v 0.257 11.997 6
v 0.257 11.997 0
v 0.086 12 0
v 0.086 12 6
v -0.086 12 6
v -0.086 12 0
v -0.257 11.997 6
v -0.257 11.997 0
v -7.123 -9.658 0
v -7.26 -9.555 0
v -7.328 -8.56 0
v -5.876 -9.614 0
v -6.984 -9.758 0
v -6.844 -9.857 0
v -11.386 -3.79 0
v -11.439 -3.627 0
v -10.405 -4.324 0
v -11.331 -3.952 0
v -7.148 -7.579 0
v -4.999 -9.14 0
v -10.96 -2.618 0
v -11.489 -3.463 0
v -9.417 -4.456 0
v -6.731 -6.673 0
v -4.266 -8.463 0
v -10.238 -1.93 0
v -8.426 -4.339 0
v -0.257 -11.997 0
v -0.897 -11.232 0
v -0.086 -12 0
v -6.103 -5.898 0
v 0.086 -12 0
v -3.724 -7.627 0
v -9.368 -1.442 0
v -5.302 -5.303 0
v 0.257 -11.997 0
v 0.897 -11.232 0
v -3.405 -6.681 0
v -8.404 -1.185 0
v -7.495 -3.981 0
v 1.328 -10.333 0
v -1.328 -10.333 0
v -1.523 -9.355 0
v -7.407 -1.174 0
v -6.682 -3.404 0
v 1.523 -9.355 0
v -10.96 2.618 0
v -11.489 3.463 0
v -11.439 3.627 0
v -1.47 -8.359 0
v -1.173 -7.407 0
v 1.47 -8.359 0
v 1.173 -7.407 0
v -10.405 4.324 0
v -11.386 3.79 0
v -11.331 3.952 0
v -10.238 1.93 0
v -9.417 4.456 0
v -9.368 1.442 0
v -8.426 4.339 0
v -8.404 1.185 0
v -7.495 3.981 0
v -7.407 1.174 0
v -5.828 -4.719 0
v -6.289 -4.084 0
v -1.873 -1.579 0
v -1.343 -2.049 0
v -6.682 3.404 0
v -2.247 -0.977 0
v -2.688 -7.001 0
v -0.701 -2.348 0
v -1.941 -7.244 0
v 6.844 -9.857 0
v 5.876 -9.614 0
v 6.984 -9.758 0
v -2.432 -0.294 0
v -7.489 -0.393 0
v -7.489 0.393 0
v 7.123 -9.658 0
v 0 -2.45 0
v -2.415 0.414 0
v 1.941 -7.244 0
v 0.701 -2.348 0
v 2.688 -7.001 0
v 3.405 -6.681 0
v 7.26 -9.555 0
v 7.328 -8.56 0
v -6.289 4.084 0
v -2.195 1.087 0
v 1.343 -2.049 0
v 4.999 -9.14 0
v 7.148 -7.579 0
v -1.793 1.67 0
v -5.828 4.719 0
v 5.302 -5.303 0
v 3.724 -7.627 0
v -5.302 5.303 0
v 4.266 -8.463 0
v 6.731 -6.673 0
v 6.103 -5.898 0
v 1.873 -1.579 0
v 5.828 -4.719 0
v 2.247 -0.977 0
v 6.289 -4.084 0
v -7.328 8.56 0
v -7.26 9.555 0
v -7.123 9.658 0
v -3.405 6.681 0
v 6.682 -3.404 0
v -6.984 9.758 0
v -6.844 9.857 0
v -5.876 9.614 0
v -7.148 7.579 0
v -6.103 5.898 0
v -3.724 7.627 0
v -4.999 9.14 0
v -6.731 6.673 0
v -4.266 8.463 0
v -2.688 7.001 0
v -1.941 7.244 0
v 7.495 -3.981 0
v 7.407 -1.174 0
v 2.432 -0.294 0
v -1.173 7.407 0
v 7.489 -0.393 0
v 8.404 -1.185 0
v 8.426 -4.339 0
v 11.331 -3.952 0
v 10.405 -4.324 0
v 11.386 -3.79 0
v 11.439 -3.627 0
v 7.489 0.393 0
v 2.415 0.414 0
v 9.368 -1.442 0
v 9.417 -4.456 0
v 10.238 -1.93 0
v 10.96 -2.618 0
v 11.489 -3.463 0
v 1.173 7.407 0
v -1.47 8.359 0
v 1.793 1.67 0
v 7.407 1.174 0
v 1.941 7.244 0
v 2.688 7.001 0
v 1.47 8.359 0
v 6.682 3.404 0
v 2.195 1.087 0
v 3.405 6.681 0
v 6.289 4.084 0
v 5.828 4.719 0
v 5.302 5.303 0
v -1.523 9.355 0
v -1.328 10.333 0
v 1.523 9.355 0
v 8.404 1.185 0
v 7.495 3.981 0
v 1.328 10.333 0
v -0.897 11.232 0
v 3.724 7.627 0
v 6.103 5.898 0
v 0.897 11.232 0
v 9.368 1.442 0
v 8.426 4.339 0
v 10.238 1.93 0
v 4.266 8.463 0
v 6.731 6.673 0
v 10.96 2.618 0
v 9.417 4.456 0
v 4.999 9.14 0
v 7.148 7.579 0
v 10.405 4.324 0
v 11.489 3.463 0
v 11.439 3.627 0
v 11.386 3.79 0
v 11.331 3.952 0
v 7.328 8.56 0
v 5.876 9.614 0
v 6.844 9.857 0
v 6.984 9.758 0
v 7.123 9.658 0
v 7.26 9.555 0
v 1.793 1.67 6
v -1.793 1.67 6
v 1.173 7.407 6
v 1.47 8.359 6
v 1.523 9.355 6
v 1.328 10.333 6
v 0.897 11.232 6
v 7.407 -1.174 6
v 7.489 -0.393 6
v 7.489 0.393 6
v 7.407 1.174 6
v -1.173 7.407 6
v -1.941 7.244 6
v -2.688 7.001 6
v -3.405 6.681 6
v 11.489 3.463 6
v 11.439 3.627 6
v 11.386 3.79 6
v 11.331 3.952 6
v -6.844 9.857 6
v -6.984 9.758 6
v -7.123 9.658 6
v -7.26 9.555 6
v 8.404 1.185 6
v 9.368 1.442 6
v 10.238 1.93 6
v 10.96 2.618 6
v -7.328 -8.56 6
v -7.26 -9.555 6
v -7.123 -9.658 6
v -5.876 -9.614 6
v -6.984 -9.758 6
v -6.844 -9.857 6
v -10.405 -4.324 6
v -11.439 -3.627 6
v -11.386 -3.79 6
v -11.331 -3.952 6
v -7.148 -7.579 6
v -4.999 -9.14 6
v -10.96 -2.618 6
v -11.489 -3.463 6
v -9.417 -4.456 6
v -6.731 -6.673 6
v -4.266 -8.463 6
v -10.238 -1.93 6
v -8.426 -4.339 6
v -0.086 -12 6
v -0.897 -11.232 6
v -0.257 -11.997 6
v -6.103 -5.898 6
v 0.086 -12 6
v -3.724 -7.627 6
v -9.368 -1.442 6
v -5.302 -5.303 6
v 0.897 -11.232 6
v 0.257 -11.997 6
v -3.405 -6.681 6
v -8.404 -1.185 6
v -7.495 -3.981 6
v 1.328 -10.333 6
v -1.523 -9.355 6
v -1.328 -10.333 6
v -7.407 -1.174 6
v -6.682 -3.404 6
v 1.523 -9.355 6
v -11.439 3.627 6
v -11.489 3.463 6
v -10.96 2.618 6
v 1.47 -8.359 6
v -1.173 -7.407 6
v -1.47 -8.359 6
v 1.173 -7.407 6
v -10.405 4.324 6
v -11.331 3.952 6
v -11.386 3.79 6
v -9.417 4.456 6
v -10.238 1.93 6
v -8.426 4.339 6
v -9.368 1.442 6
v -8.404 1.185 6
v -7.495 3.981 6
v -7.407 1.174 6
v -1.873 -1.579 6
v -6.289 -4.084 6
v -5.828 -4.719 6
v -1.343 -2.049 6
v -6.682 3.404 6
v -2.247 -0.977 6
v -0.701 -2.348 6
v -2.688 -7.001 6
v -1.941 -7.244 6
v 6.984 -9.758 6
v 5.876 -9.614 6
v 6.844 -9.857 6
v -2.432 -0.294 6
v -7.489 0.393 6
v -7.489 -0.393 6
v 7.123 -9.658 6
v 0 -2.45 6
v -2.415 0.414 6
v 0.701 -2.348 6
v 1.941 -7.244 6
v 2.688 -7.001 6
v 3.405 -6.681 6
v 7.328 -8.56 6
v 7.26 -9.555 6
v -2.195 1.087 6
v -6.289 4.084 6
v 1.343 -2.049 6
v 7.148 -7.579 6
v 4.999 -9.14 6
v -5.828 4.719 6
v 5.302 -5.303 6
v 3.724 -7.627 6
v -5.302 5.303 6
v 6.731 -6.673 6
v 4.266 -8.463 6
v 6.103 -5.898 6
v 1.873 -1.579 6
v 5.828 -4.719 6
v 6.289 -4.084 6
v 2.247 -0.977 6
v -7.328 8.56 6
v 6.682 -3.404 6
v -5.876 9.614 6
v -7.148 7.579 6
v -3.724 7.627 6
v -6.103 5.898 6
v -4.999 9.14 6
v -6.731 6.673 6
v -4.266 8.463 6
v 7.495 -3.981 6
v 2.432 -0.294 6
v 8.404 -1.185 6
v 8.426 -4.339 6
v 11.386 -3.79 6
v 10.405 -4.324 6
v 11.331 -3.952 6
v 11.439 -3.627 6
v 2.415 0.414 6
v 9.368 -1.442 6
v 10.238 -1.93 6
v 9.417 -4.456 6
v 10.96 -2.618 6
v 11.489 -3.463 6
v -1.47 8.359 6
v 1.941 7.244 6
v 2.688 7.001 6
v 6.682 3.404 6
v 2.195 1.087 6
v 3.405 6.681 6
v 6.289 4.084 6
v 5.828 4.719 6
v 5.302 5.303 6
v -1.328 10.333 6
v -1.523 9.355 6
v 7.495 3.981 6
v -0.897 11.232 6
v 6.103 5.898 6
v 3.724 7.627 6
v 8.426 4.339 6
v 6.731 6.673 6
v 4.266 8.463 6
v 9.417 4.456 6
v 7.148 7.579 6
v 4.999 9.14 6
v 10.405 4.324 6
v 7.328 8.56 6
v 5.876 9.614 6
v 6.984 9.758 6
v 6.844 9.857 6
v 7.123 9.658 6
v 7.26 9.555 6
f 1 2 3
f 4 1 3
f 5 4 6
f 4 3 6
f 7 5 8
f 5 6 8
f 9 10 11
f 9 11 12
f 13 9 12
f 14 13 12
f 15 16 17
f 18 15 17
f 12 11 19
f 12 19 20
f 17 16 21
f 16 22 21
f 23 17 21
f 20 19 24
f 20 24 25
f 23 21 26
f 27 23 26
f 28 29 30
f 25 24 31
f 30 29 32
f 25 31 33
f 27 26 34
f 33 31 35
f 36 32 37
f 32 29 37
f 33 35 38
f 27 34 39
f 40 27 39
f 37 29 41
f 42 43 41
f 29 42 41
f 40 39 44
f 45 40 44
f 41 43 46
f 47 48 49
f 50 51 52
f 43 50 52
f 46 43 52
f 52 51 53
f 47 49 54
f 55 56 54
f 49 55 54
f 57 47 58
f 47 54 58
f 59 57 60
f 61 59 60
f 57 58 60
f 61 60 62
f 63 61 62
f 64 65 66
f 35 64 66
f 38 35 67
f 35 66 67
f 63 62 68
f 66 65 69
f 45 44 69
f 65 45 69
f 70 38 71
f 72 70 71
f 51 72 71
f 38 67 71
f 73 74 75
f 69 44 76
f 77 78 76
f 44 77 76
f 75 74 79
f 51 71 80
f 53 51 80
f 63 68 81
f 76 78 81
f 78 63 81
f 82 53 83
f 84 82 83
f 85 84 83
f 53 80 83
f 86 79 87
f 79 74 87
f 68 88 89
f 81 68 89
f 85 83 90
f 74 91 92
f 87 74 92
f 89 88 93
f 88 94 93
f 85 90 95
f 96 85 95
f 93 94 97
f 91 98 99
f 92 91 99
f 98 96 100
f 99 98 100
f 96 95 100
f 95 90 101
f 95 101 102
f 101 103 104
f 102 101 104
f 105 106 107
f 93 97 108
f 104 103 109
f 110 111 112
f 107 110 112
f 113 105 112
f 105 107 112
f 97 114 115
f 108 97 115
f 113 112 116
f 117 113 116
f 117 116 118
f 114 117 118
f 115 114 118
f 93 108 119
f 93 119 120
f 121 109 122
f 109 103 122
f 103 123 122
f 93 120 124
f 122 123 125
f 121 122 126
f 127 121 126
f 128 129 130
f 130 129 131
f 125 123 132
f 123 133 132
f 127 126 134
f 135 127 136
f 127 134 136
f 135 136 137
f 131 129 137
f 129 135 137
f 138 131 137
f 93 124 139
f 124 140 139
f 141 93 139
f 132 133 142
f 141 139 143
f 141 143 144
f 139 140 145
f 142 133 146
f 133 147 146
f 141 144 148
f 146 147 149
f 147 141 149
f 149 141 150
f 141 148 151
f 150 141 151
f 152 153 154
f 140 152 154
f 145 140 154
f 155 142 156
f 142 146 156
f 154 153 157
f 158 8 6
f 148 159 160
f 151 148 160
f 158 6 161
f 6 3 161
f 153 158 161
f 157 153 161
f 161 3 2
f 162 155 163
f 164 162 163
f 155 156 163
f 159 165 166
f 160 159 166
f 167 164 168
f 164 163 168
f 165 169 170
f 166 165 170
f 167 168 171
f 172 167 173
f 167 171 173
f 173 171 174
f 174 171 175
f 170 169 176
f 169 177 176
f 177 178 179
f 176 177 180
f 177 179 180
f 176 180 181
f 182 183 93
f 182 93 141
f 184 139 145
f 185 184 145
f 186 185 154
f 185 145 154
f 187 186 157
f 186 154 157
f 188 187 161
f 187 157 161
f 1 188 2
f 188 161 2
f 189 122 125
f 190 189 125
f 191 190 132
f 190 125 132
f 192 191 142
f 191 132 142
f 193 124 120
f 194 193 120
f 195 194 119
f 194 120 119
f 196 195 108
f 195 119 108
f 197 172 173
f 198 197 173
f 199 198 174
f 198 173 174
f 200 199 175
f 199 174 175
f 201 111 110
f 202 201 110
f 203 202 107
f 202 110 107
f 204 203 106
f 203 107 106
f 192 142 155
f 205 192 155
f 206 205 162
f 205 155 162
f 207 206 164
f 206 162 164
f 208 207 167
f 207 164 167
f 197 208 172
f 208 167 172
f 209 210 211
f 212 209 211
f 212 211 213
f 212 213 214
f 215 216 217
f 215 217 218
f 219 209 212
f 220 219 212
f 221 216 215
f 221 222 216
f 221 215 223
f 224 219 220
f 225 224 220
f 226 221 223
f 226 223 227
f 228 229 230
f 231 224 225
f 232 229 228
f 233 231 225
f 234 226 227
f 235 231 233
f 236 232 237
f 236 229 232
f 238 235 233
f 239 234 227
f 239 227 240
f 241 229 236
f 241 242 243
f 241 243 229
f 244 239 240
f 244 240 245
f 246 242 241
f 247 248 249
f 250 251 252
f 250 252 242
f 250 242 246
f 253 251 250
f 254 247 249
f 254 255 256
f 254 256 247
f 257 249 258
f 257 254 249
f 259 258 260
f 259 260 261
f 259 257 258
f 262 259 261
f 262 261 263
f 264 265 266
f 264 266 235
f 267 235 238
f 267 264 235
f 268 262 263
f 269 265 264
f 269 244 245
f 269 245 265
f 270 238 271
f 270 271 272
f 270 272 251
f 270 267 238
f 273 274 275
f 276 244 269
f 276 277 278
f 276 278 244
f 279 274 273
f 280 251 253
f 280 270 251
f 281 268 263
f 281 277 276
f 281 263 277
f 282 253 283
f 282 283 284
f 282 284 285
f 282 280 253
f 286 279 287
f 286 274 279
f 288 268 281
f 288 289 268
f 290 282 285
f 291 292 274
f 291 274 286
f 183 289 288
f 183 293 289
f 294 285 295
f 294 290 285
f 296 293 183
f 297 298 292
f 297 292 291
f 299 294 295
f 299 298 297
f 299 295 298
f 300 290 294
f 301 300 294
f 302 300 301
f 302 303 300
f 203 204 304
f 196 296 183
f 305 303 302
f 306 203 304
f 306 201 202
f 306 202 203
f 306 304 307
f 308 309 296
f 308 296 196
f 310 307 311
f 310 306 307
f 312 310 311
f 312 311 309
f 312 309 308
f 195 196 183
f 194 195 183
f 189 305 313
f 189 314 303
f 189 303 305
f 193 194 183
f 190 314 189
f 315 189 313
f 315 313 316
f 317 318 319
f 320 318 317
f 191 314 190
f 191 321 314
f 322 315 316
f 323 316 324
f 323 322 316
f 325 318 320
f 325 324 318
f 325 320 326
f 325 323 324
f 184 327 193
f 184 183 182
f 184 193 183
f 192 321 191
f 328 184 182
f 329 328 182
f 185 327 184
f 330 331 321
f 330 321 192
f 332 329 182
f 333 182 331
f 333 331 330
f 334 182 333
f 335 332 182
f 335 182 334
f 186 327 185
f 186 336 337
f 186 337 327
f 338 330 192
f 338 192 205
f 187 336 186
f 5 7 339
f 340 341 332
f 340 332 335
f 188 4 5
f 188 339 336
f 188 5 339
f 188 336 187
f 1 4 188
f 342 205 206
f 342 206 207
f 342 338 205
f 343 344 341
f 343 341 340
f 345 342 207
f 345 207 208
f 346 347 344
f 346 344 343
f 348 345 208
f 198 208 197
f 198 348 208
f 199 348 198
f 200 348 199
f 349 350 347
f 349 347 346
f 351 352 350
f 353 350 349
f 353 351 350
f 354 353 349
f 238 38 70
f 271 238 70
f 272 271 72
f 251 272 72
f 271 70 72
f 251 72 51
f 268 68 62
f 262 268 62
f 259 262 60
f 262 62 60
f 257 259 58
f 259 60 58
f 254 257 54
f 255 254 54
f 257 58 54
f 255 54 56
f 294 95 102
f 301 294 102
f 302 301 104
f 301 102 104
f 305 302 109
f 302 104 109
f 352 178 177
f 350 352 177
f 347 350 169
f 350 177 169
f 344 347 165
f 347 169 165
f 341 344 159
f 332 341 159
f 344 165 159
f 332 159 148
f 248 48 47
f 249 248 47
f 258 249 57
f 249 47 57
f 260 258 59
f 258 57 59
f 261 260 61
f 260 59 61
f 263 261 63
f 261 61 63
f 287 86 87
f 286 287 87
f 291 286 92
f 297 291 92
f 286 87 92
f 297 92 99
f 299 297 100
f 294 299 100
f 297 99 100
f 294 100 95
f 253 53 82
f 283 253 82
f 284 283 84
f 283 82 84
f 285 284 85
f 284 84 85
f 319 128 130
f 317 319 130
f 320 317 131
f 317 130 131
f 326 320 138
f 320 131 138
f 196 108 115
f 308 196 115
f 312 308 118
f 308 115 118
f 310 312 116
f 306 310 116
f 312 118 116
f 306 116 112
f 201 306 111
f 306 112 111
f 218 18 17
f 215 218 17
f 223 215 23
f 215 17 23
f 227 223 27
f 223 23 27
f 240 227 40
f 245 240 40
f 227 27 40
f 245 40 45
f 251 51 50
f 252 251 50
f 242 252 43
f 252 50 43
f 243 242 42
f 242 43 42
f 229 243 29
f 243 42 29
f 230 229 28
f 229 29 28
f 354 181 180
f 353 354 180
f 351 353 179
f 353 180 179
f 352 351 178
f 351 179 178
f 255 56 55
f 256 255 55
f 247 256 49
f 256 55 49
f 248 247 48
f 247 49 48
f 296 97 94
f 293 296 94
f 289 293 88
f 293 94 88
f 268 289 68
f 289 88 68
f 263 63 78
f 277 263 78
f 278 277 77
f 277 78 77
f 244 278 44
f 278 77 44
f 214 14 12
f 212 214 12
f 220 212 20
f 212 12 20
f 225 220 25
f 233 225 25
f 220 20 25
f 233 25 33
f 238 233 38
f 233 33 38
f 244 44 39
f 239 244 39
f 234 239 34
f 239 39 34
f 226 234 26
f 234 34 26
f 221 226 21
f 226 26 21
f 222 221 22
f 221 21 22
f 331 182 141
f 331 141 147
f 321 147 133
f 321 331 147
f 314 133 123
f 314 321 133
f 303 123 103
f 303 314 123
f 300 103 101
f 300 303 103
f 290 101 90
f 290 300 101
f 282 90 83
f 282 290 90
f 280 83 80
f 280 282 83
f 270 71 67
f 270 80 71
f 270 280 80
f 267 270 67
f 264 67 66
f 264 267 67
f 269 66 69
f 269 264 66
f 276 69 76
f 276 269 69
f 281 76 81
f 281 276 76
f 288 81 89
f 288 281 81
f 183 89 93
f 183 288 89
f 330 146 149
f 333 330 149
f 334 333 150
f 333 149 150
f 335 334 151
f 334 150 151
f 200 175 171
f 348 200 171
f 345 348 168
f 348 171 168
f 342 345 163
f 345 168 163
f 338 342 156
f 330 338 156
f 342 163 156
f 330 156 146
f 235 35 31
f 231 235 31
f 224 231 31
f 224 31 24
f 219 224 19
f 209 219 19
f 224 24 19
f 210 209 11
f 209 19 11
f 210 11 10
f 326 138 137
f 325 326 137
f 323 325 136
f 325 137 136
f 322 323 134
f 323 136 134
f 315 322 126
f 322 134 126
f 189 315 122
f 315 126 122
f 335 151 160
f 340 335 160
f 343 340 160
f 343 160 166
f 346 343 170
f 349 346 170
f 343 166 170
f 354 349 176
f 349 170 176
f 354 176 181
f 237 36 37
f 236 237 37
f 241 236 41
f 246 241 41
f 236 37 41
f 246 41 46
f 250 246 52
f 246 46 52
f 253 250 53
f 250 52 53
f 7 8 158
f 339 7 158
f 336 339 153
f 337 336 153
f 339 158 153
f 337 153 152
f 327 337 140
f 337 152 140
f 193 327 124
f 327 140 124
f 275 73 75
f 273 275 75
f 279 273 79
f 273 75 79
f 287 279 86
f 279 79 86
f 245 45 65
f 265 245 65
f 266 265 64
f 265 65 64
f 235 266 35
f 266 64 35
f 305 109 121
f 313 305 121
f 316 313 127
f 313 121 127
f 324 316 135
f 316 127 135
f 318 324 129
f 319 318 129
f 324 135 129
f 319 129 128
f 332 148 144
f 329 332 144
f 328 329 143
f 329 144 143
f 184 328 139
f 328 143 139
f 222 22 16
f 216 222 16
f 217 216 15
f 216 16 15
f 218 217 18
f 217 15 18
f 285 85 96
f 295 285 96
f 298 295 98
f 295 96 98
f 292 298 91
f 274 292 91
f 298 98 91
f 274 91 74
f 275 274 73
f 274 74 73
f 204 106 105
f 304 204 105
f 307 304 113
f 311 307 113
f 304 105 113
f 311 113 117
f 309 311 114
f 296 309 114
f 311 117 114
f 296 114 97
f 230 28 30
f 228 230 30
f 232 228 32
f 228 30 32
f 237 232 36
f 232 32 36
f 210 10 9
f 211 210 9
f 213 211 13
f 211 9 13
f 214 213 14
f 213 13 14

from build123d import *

# Parameters (mm, degrees)
SKETCH4_R           = 2
BOSS_EXTRUDE3_DEPTH = 6
SKETCH6_R           = 3.276903459
BOSS_EXTRUDE4_DEPTH = 6
CUT_EXTRUDE1_DEPTH  = 10


with BuildPart() as part:
    # Sketch4 → Boss-Extrude3 (new body)
    with BuildSketch(Plane.XY):
        with BuildLine():
            ThreePointArc((11.330682707, 3.9516616), (8.917819898, 4.428819506), (6.681915604, 3.403968986))
            ThreePointArc((6.681915604, 3.403968986), (6.066818441, 4.407801607), (5.302192362, 5.302995112))
            ThreePointArc((5.302192362, 5.302995112), (6.967815552, 7.112770233), (7.259627029, 9.554989032))
            ThreePointArc((7.259627029, 9.554989032), (7.053423028, 9.708203932), (6.843986457, 9.856969584))
            ThreePointArc((6.843986457, 9.856969584), (4.61147306, 8.824753264), (3.40498051, 6.681400208))
            ThreePointArc((3.40498051, 6.681400208), (2.317318441, 7.131972816), (1.172541409, 7.406763642))
            ThreePointArc((1.172541409, 7.406763642), (1.456299749, 9.849931218), (0.256880001, 11.997250213))
            ThreePointArc((0.256880001, 11.997250213), (0, 12), (-0.256880001, 11.997250213))
            ThreePointArc((-0.256880001, 11.997250213), (-1.456299749, 9.849931218), (-1.172541409, 7.406763642))
            ThreePointArc((-1.172541409, 7.406763642), (-2.317318441, 7.131972816), (-3.404980509, 6.681400207))
            ThreePointArc((-3.404980509, 6.681400207), (-4.61147306, 8.824753264), (-6.843986457, 9.856969584))
            ThreePointArc((-6.843986457, 9.856969584), (-7.053423028, 9.708203933), (-7.259627029, 9.554989032))
            ThreePointArc((-7.259627029, 9.554989032), (-6.967815552, 7.112770233), (-5.302192362, 5.302995112))
            ThreePointArc((-5.302192362, 5.302995112), (-6.066818441, 4.407801607), (-6.681915604, 3.403968986))
            ThreePointArc((-6.681915604, 3.403968986), (-8.917819898, 4.428819506), (-11.330682707, 3.9516616))
            ThreePointArc((-11.330682707, 3.9516616), (-11.412678196, 3.708203933), (-11.489443278, 3.463046803))
            ThreePointArc((-11.489443278, 3.463046803), (-9.817862641, 1.658772773), (-7.406586048, 1.173662691))
            ThreePointArc((-7.406586048, 1.173662691), (-7.499, 0), (-7.406586048, -1.173662691))
            ThreePointArc((-7.406586048, -1.173662691), (-9.817862641, -1.658772773), (-11.489443278, -3.463046803))
            ThreePointArc((-11.489443278, -3.463046803), (-11.412678196, -3.708203933), (-11.330682707, -3.9516616))
            ThreePointArc((-11.330682707, -3.9516616), (-8.917819898, -4.428819506), (-6.681915604, -3.403968986))
            ThreePointArc((-6.681915604, -3.403968986), (-6.066818441, -4.407801607), (-5.302192362, -5.302995112))
            ThreePointArc((-5.302192362, -5.302995112), (-6.967815552, -7.112770233), (-7.259627029, -9.554989032))
            ThreePointArc((-7.259627029, -9.554989032), (-7.053423028, -9.708203932), (-6.843986457, -9.856969584))
            ThreePointArc((-6.843986457, -9.856969584), (-4.61147306, -8.824753264), (-3.404980509, -6.681400207))
            ThreePointArc((-3.404980509, -6.681400207), (-2.317318441, -7.131972816), (-1.172541409, -7.406763642))
            ThreePointArc((-1.172541409, -7.406763642), (-1.456299749, -9.849931218), (-0.256880001, -11.997250213))
            ThreePointArc((-0.256880001, -11.997250213), (0, -12), (0.256880001, -11.997250213))
            ThreePointArc((0.256880001, -11.997250213), (1.456299749, -9.849931218), (1.172541409, -7.406763642))
            ThreePointArc((1.172541409, -7.406763642), (2.317318441, -7.131972816), (3.404980509, -6.681400207))
            ThreePointArc((3.404980509, -6.681400207), (4.61147306, -8.824753264), (6.843986457, -9.856969584))
            ThreePointArc((6.843986457, -9.856969584), (7.053423027, -9.708203933), (7.259627029, -9.554989032))
            ThreePointArc((7.259627029, -9.554989032), (6.967815552, -7.112770233), (5.302192362, -5.302995112))
            ThreePointArc((5.302192362, -5.302995112), (6.066818441, -4.407801607), (6.681915604, -3.403968986))
            ThreePointArc((6.681915604, -3.403968986), (8.917819898, -4.428819506), (11.330682707, -3.9516616))
            ThreePointArc((11.330682707, -3.9516616), (11.412678196, -3.708203932), (11.489443278, -3.463046803))
            ThreePointArc((11.489443278, -3.463046803), (9.817862641, -1.658772773), (7.406586048, -1.173662691))
            ThreePointArc((7.406586048, -1.173662691), (7.499, 0), (7.406586048, 1.173662691))
            ThreePointArc((7.406586048, 1.173662691), (9.817862641, 1.658772773), (11.489443278, 3.463046803))
            ThreePointArc((11.489443278, 3.463046803), (11.412678196, 3.708203932), (11.330682707, 3.9516616))
        make_face()
        Circle(SKETCH4_R, mode=Mode.SUBTRACT)
    extrude(amount=BOSS_EXTRUDE3_DEPTH)

    # Sketch6 → Boss-Extrude4 (add)
    with BuildSketch(Plane.XY.offset(6)):
        Circle(SKETCH6_R)
    extrude(amount=-BOSS_EXTRUDE4_DEPTH)

    # Sketch7 → Cut-Extrude1 (cut)
    with BuildSketch(Plane.XY.offset(6)):
        with BuildLine():
            Line((-1.792651667, 1.67), (1.792651667, 1.67))
            ThreePointArc((1.792651667, 1.67), (0, -2.45), (-1.792651667, 1.67))
        make_face()
    extrude(amount=-CUT_EXTRUDE1_DEPTH, mode=Mode.SUBTRACT)


solid = part.part
